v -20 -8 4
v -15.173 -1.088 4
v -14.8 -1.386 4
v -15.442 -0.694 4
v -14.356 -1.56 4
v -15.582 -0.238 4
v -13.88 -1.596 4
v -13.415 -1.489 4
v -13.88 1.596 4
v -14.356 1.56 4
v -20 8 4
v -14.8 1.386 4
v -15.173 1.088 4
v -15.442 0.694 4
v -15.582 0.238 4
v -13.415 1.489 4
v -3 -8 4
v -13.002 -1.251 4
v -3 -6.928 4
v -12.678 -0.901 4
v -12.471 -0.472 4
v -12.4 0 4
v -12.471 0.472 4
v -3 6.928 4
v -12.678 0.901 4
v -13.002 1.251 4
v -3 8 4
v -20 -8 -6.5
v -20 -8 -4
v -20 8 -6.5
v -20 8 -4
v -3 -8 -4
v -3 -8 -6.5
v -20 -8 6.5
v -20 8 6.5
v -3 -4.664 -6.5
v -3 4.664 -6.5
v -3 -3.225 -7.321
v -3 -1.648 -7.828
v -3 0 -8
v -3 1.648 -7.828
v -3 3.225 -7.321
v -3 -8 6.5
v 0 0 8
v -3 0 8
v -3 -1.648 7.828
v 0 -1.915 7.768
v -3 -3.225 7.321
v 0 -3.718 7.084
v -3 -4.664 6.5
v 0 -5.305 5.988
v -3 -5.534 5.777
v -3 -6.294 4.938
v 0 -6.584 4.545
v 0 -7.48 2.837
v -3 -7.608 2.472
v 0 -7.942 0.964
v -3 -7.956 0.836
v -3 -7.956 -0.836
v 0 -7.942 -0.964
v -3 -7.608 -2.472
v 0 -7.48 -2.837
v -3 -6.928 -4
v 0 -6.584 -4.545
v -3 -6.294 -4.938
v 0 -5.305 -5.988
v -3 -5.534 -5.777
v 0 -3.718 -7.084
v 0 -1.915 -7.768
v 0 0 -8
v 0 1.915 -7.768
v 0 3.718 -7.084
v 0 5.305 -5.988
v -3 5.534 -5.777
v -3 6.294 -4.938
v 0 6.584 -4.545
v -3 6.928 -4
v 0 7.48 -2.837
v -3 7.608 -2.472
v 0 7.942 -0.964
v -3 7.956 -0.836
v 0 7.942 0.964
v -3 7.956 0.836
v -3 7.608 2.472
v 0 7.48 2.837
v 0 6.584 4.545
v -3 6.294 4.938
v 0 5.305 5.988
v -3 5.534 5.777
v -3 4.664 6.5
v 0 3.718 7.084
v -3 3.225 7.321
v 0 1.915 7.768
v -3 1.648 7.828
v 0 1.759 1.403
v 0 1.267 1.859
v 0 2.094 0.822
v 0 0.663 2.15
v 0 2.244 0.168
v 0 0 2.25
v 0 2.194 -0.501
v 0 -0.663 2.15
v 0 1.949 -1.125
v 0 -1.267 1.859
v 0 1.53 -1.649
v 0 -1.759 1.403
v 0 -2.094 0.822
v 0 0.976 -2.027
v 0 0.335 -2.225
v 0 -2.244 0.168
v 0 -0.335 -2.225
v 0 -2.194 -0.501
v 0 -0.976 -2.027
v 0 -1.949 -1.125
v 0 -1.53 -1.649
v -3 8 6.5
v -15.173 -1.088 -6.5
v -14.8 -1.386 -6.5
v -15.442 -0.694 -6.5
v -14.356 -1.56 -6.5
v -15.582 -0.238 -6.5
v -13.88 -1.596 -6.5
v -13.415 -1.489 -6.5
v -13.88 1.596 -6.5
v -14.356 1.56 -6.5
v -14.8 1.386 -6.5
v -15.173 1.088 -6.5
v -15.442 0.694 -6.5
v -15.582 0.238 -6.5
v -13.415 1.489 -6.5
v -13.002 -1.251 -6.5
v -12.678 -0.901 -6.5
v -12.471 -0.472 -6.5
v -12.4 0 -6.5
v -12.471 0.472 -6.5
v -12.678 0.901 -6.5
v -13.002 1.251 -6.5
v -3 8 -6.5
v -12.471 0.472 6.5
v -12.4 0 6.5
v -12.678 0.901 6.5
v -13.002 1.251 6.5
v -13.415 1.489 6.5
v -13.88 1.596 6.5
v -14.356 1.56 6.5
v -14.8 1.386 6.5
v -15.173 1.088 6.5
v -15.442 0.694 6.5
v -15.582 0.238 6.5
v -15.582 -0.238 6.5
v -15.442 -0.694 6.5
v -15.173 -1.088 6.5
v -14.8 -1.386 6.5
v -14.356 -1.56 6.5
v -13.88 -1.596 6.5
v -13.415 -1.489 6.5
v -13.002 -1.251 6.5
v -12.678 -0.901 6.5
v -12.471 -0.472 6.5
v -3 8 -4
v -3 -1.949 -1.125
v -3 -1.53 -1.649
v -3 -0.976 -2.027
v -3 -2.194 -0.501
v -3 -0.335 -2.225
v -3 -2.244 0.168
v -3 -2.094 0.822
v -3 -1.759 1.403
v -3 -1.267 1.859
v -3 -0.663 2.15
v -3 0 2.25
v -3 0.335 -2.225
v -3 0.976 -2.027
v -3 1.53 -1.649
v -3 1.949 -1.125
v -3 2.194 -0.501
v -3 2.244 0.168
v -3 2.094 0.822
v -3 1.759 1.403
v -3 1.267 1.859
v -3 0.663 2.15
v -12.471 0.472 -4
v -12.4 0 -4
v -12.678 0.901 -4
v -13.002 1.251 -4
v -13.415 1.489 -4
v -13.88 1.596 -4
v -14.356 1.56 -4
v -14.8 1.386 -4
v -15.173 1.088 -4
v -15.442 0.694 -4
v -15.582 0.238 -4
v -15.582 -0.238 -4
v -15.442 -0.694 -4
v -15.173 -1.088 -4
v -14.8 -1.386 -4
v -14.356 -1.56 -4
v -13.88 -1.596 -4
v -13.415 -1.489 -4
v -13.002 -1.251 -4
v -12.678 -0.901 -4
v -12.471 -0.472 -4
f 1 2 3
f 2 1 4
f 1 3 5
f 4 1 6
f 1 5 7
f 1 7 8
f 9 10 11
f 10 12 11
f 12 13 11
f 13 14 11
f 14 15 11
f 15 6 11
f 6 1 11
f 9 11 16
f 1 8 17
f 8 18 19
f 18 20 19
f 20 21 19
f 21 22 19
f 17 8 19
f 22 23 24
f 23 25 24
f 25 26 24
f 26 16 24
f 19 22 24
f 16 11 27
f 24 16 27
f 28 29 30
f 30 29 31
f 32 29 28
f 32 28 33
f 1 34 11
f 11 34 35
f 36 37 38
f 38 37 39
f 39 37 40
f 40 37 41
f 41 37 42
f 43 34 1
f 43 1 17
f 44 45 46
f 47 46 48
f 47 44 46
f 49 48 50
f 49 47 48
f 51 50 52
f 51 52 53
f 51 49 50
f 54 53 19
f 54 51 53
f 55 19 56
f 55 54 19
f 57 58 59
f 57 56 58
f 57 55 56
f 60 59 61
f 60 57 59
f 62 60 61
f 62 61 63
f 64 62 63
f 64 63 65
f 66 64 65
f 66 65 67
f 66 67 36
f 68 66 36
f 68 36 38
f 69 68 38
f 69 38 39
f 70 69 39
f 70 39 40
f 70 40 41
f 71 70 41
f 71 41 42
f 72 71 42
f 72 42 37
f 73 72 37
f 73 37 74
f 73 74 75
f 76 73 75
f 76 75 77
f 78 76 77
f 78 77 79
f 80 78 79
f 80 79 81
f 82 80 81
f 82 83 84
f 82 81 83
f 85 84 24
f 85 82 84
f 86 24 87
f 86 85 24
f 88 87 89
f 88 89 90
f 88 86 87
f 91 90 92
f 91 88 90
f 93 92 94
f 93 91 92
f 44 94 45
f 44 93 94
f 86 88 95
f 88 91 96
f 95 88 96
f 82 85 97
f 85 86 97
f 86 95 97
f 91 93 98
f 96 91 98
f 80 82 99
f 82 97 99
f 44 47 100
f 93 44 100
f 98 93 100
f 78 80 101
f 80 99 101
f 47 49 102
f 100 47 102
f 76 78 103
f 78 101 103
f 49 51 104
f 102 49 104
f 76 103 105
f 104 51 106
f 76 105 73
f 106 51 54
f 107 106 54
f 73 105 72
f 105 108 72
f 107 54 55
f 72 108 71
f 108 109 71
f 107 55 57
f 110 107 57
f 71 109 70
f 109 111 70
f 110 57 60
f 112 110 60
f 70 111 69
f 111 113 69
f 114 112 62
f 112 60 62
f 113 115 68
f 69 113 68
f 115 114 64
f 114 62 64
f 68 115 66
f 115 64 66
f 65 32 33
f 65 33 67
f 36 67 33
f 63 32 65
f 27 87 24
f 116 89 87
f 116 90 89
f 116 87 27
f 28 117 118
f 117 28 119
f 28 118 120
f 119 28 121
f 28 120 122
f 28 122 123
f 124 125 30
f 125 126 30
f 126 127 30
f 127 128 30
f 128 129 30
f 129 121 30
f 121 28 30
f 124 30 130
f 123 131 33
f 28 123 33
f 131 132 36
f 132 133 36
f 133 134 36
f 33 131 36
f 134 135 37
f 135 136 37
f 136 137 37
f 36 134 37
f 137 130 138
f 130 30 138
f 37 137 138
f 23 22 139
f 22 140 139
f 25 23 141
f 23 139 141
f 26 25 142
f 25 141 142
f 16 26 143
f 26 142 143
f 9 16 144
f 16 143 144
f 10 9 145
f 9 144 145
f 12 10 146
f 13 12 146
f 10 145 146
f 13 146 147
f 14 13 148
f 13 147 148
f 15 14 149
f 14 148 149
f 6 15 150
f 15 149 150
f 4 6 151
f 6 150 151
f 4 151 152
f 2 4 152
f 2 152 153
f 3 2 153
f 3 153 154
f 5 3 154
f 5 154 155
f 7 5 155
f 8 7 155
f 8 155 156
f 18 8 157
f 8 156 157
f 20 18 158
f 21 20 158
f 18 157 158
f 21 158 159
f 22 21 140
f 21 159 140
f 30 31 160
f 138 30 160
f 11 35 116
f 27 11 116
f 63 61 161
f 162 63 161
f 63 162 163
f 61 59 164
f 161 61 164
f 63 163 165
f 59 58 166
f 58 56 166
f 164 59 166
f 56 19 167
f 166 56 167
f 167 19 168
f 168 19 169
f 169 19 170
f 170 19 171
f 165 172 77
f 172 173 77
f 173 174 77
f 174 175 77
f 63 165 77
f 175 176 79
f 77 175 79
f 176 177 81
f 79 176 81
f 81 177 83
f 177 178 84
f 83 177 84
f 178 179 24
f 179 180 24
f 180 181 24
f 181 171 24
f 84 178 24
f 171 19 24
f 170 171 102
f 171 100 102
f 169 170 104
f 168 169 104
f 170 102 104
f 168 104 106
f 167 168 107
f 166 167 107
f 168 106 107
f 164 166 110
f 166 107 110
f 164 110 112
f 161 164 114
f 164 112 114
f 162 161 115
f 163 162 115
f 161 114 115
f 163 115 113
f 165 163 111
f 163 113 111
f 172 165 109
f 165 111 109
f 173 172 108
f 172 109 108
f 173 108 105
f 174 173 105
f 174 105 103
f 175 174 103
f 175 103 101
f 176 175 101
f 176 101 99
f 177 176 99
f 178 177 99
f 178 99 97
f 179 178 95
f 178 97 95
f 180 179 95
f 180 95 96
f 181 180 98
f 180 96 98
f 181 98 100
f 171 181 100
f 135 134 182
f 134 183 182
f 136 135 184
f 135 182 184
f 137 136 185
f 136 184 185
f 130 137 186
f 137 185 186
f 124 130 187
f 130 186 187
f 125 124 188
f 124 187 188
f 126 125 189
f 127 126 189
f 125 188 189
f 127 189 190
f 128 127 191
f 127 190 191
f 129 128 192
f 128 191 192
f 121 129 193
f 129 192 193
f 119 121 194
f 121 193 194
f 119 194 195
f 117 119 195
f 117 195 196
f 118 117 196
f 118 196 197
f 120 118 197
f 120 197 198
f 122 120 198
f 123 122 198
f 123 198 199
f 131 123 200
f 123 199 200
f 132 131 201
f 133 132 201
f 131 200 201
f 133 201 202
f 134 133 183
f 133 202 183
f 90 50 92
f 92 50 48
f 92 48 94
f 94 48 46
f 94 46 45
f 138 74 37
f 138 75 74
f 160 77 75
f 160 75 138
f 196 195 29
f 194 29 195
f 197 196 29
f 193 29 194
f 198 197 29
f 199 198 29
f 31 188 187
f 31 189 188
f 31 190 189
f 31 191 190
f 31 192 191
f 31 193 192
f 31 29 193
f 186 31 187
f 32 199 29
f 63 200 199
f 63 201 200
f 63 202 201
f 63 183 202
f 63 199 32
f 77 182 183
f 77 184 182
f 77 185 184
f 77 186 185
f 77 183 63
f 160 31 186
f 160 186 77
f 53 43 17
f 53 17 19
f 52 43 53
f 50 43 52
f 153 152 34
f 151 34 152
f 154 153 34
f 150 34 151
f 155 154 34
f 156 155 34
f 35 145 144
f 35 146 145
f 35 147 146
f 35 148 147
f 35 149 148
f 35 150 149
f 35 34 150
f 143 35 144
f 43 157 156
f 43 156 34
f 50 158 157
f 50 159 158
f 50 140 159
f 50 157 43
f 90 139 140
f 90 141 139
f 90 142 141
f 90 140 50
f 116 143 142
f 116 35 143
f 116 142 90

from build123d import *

# Parameters (mm, degrees)
BASE_SKETCH_W        = 3
BASE_SKETCH_H        = 8
CHEEK_BLOCK_SKETCH_W = 17
CHEEK_BLOCK_SKETCH_H = 16
CHEEK_BLOCK_DEPTH    = 6.5
GAP_SKETCH_W         = 18
GAP_SKETCH_H         = 18
GAP_DEPTH            = 4
PIN_HOLE_SKETCH_R    = 1.6
PIN_HOLE_DEPTH       = 8.5
SCREW_HOLE_SKETCH_W  = 4
SCREW_HOLE_SKETCH_H  = 2.25


with BuildPart() as part:
    # Base Sketch → Base (revolve)
    with BuildSketch(Plane.XY):
        with Locations((-1.5, 4)):
            Rectangle(BASE_SKETCH_W, BASE_SKETCH_H)
    revolve(axis=Axis((-3000, 0, 0), (1, 0, 0)))

    # Cheek Block Sketch → Cheek Block (add, symmetric)
    with BuildSketch(Plane.XY):
        with Locations((-11.5, 0)):
            Rectangle(CHEEK_BLOCK_SKETCH_W, CHEEK_BLOCK_SKETCH_H)
    extrude(amount=CHEEK_BLOCK_DEPTH, both=True)

    # Gap Sketch → Gap (cut, symmetric)
    with BuildSketch(Plane.XY):
        with Locations((-12, 0)):
            Rectangle(GAP_SKETCH_W, GAP_SKETCH_H)
    extrude(amount=GAP_DEPTH, both=True, mode=Mode.SUBTRACT)

    # Pin Hole Sketch → Pin Hole (cut, symmetric)
    with BuildSketch(Plane.XY):
        with Locations((-14, 0)):
            Circle(PIN_HOLE_SKETCH_R)
    extrude(amount=PIN_HOLE_DEPTH, both=True, mode=Mode.SUBTRACT)

    # Screw Hole Sketch → Screw Hole (revolve, cut)
    with BuildSketch(Plane.XY):
        with Locations((-1.5, 1.125)):
            Rectangle(SCREW_HOLE_SKETCH_W, SCREW_HOLE_SKETCH_H)
    revolve(axis=Axis((-3000, 0, 0), (1, 0, 0)), mode=Mode.SUBTRACT)


solid = part.part
